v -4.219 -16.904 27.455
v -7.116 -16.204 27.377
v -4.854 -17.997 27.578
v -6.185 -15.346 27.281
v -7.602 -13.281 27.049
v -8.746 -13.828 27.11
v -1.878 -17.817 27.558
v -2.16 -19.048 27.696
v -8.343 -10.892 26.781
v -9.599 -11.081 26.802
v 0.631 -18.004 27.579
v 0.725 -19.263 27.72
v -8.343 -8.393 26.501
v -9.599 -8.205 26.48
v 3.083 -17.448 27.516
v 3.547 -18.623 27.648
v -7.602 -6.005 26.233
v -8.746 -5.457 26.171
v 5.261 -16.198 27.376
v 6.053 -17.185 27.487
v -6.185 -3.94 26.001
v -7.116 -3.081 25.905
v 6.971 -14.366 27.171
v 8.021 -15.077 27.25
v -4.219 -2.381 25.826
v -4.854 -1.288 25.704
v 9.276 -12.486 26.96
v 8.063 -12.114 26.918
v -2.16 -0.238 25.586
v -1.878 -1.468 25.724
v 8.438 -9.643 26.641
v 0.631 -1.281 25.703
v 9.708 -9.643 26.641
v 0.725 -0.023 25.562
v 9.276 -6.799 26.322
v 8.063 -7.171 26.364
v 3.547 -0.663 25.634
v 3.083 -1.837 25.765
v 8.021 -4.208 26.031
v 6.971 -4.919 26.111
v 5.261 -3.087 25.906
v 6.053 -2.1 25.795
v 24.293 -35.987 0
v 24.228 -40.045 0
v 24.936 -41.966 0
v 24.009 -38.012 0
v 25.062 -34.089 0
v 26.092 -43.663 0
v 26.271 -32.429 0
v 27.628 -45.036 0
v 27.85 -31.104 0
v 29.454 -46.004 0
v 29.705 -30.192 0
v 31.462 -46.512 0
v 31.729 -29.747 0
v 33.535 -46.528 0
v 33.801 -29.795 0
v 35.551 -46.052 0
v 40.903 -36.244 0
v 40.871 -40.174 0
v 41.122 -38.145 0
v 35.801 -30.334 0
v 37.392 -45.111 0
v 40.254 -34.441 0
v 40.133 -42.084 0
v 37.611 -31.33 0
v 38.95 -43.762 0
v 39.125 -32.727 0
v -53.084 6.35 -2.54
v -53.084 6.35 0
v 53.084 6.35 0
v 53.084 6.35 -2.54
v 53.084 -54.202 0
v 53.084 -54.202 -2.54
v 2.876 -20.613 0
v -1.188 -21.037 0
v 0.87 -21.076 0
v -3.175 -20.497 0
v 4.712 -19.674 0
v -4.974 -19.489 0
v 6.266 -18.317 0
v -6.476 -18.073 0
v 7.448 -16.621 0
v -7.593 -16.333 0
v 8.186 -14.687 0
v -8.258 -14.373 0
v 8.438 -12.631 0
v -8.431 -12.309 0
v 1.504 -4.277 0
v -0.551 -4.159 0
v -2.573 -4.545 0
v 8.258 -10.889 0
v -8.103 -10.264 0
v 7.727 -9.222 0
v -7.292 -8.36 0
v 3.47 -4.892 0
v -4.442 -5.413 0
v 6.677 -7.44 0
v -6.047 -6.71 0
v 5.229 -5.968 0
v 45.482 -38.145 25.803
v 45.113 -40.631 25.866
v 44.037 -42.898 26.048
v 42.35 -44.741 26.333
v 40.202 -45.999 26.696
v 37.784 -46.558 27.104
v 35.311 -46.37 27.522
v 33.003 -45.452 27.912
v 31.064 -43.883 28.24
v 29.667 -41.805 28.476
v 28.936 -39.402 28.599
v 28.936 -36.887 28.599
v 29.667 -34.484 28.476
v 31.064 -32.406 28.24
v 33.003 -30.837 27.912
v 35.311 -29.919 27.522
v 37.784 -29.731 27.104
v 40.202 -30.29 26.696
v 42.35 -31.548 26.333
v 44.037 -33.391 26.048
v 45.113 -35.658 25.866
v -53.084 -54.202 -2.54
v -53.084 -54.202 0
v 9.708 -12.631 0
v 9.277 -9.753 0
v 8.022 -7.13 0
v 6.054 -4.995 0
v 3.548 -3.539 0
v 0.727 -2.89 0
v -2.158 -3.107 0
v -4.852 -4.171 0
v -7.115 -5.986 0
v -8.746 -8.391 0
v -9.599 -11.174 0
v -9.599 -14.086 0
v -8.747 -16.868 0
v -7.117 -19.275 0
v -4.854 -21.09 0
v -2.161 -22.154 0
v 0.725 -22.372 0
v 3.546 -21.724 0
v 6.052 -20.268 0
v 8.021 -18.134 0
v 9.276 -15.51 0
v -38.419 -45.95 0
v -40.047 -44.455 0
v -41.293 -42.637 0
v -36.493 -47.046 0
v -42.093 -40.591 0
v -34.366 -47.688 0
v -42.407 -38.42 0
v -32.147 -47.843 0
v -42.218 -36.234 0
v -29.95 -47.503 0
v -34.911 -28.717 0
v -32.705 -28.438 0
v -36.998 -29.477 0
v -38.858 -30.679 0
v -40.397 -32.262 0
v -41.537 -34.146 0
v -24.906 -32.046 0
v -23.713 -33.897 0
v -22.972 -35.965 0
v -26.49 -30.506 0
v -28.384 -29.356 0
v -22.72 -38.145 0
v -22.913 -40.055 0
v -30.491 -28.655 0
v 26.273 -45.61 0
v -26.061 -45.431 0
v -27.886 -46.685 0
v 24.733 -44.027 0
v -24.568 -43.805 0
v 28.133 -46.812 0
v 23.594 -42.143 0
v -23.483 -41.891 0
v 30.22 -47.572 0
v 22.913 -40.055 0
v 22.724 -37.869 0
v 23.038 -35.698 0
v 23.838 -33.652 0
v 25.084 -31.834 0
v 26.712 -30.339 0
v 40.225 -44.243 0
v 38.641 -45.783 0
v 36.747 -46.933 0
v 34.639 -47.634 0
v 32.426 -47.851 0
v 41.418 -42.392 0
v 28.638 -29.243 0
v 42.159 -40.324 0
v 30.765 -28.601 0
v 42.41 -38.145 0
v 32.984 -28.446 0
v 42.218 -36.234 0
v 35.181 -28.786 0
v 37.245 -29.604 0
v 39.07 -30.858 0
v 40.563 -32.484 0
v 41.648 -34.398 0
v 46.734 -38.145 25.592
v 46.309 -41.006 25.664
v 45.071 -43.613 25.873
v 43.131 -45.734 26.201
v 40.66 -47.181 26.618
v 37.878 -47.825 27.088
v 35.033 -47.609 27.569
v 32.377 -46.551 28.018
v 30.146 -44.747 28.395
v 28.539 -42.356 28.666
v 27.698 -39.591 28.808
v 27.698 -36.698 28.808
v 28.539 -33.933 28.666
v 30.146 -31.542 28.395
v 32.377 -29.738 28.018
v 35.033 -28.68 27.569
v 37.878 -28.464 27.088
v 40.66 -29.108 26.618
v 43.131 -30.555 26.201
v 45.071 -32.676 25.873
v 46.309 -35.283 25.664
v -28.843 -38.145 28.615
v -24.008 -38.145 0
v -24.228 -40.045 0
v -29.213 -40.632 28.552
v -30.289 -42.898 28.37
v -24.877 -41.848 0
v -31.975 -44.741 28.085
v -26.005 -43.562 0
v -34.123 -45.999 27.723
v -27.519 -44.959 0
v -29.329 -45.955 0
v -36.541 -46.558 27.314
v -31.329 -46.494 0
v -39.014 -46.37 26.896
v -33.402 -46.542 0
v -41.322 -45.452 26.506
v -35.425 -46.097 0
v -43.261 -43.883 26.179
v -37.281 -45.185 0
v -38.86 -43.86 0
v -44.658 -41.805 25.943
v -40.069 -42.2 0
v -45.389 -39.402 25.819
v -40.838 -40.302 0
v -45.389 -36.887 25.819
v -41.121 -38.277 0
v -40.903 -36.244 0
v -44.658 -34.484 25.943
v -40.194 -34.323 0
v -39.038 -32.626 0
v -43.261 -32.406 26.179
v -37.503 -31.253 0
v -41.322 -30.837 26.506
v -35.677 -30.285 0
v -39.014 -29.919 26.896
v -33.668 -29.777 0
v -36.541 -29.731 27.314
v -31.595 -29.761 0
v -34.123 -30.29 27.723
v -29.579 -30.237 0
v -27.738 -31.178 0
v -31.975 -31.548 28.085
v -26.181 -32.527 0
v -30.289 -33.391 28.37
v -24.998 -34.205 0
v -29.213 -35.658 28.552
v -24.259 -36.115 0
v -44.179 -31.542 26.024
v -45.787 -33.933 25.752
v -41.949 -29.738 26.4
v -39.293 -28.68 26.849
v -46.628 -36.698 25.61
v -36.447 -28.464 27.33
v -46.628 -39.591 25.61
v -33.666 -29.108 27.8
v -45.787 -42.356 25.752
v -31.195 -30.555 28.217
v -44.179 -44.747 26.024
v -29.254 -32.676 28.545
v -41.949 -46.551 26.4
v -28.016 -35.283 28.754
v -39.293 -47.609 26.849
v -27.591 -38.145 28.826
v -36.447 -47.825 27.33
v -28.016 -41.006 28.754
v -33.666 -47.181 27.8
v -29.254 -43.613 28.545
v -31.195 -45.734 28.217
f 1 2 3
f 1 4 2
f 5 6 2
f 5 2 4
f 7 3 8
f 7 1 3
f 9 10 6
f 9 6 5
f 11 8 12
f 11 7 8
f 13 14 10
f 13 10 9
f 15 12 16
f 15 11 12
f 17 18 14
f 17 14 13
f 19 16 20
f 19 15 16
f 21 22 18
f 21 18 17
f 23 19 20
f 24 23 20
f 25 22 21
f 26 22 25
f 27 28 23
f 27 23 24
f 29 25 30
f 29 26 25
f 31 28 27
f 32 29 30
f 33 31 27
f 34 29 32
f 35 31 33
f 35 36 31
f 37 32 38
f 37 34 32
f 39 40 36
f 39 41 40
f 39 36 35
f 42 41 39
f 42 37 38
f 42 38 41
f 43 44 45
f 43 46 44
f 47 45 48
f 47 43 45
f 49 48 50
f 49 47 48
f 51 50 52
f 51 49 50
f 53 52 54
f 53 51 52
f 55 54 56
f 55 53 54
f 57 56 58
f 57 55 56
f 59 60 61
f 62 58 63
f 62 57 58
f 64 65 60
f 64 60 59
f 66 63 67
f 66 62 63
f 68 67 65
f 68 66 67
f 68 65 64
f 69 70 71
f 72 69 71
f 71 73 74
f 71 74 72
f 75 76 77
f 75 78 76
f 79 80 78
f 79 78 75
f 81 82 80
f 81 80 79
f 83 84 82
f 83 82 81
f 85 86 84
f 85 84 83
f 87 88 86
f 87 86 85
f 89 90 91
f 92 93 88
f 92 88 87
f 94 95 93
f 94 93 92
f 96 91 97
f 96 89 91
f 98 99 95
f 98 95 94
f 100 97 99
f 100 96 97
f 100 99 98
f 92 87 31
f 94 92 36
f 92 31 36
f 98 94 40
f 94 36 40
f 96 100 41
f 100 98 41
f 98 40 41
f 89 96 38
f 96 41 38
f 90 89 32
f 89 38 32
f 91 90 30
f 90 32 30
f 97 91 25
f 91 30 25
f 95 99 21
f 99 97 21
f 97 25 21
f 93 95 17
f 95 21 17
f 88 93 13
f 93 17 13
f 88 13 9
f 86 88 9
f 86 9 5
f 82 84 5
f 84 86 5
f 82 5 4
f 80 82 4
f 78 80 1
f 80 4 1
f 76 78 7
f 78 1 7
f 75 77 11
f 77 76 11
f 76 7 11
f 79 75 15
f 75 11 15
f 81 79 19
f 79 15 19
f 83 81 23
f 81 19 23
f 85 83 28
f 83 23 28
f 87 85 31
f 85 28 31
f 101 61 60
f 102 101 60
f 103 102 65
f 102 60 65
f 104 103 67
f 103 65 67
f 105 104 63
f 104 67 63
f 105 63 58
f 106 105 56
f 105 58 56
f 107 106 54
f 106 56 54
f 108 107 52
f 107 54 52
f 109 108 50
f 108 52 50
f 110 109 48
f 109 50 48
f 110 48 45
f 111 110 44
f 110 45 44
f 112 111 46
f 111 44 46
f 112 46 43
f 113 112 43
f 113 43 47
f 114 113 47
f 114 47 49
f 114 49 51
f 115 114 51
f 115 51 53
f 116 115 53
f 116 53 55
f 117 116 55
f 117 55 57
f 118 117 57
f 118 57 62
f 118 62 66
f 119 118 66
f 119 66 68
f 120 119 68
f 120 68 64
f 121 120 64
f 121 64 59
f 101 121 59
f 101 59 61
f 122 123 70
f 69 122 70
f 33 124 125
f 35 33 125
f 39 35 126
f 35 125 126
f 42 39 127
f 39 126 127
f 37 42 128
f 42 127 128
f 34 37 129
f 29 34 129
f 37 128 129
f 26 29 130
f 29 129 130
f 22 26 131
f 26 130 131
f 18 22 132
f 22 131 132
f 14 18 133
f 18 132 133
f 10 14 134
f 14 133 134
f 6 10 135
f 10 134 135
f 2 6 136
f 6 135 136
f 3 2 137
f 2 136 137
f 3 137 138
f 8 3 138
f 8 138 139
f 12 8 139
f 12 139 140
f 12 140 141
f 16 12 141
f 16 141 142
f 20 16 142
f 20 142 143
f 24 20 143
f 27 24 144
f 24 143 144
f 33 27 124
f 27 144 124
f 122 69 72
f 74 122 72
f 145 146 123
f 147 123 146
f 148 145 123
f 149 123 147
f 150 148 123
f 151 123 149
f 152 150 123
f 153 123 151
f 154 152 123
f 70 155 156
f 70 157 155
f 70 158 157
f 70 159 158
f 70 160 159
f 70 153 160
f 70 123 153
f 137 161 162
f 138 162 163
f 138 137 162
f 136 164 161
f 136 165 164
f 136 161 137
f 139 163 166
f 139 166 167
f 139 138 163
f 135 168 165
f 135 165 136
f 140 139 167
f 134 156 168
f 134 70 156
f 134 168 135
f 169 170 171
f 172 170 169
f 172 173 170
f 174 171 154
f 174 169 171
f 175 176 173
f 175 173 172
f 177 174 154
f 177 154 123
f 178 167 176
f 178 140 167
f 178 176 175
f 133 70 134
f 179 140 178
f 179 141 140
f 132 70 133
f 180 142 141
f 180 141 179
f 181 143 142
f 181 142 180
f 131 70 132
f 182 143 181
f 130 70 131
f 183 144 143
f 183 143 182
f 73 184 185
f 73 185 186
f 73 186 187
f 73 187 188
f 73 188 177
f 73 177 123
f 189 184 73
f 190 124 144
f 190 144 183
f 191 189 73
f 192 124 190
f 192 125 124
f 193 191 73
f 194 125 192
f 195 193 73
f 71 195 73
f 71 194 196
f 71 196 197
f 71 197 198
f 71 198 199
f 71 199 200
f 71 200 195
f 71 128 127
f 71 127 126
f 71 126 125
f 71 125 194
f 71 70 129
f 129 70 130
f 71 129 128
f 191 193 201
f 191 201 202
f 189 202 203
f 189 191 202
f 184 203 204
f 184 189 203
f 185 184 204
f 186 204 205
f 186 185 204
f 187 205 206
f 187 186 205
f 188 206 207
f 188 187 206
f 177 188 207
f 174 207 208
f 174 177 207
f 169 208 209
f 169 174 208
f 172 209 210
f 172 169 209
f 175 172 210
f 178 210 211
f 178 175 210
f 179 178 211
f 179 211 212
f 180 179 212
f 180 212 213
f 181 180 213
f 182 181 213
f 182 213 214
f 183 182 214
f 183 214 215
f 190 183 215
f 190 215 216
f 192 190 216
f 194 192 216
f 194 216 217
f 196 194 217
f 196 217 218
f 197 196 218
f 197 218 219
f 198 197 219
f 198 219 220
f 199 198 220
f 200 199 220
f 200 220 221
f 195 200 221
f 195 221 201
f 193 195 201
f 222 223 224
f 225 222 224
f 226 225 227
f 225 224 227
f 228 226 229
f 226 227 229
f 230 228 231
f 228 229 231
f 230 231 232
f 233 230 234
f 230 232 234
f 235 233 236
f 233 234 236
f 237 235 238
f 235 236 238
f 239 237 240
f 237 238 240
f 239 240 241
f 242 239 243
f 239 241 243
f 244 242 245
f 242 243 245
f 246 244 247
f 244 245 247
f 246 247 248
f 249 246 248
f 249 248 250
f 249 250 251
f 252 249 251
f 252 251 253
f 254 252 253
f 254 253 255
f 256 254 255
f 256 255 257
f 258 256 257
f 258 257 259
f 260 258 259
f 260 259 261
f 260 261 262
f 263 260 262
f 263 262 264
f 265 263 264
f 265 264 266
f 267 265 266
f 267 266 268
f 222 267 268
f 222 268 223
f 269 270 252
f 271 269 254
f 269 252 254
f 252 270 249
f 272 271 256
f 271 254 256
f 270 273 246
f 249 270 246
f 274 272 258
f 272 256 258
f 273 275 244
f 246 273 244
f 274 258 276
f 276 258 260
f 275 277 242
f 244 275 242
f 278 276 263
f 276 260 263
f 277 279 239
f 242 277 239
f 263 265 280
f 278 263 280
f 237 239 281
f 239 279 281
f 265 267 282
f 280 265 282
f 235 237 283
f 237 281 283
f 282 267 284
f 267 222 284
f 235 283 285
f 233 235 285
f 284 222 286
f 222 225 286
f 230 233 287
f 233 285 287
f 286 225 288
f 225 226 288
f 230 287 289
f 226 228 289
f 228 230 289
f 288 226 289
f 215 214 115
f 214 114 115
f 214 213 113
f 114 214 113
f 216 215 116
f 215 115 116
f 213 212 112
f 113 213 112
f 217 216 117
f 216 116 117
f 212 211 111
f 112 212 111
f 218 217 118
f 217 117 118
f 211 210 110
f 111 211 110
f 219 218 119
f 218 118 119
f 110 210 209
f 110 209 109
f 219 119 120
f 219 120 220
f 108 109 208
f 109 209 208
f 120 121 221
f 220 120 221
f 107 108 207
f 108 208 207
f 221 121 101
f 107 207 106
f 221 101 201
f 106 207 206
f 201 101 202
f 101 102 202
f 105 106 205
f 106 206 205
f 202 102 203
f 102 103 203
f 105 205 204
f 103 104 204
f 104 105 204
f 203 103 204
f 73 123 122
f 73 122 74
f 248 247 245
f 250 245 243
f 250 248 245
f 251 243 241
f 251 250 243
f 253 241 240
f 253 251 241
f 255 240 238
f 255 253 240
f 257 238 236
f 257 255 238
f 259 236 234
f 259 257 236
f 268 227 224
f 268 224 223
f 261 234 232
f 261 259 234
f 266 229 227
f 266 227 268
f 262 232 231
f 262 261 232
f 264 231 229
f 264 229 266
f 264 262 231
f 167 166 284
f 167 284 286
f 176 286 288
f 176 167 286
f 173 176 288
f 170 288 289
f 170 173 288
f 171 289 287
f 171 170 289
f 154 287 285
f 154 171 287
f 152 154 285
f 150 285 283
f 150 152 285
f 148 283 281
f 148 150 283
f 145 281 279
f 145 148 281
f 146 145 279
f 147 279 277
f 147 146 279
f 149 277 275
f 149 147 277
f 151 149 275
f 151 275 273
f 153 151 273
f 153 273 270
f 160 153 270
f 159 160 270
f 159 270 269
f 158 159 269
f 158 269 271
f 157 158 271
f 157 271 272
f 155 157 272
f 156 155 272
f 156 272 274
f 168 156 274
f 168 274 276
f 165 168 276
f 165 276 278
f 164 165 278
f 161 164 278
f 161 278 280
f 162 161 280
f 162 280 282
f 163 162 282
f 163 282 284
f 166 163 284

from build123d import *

# Parameters (mm, degrees)
F2_R      = 9.70750027
F2_R_2    = 8.43750027
F3_DEPTH  = 33.02
F4_DEPTH  = 50.8
F6_DEPTH  = 127
F8_R      = 9.70750027
F8_R_2    = 8.43750027
F9_DEPTH  = 33.02
F10_W     = 144.2738771439
F10_H     = 43.9907349646
F11_DEPTH = 381
F14_R     = 9.70750027
F14_R_2   = 8.43750027
F15_DEPTH = 25.4
F16_DEPTH = 50.8
F17_W     = 94.1894035786
F17_H     = 29.3832402676
F18_DEPTH = 127
F19_W     = 106.1688474409
F19_H     = 60.55200234
F20_DEPTH = 2.54


with BuildPart() as f3:
    # F2 (on line) → F3 (new body)
    with BuildSketch(Plane(origin=(0, 0, 0), x_dir=(0.9860251287, 0, 0.1665966554), z_dir=(0.1665966554, 0, -0.9860251287))):
        with Locations((-32.11030027, 38.1445123341)):
            Circle(F2_R)
        with Locations((-32.11030027, 38.1445123341)):
            Circle(F2_R_2, mode=Mode.SUBTRACT)
    extrude(amount=-F3_DEPTH)

    # F4 (add): a face of the model
    f4_faces = [f3.faces().sort_by_distance(p)[0] for p in [
        (-46.4636912241, -38.1445123341, 25.6375864152),
    ]]
    extrude(f4_faces, amount=-F4_DEPTH)

    # F5 (on Front) → F6 (cut, symmetric)
    with BuildSketch(Plane.XZ):
        Polygon((43.3516763151, 0), (0, 0), (-49.4034710573, 0), (-49.4034710573, -35.2993682027), (43.3516763151, -35.2993682027), align=None)
    extrude(amount=F6_DEPTH, both=True, mode=Mode.SUBTRACT)



with BuildPart() as f9:
    # F8 (on line) → F9 (new body)
    with BuildSketch(Plane(origin=(0, 0, 0), x_dir=(0.9860251287, 0, -0.1665966554), z_dir=(-0.1665966554, 0, -0.9860251287))):
        with Locations((32.11030027, 38.14450207)):
            Circle(F8_R)
        with Locations((32.11030027, 38.14450207)):
            Circle(F8_R_2, mode=Mode.SUBTRACT)
    extrude(amount=-F9_DEPTH)

    # F10 (on Front) → F11 (cut, symmetric)
    with BuildSketch(Plane.XZ):
        with Locations((2.6571601629, -21.9953674823)):
            Rectangle(F10_W, F10_H)
    extrude(amount=F11_DEPTH, both=True, mode=Mode.SUBTRACT)


with BuildPart() as f15:
    # F14 (on face) → F15 (new body)
    with BuildSketch(Plane(origin=(0, 0, 0), x_dir=(1, 0, 0), z_dir=(0, 0.1114689322, 0.9937679192))):
        with Locations((0, -12.55230027)):
            Circle(F14_R)
        with Locations((0, -12.55230027)):
            Circle(F14_R_2, mode=Mode.SUBTRACT)
    extrude(amount=F15_DEPTH)

    # F16 (add): a face of the model
    f16_faces = [f15.faces().sort_by_distance(p)[0] for p in [
        (-9.4329306992, -9.642762442, 26.6408966545),
    ]]
    extrude(f16_faces, amount=-F16_DEPTH)

    # F17 (on Right) → F18 (cut, symmetric)
    with BuildSketch(Plane.YZ):
        with Locations((-17.9154733196, -14.6916201338)):
            Rectangle(F17_W, F17_H)
    extrude(amount=F18_DEPTH, both=True, mode=Mode.SUBTRACT)


with BuildPart() as f3_1:
    add(f3.part)

    add(f9.part)  # F20 merges F9

    add(f15.part)  # F20 merges F15
    # F19 (on Top) → F20 (join)
    with BuildSketch(Plane.XY):
        with Locations((0, -23.92600117)):
            Rectangle(F19_W, F19_H)
    extrude(amount=-F20_DEPTH)


solid = f3_1.part
